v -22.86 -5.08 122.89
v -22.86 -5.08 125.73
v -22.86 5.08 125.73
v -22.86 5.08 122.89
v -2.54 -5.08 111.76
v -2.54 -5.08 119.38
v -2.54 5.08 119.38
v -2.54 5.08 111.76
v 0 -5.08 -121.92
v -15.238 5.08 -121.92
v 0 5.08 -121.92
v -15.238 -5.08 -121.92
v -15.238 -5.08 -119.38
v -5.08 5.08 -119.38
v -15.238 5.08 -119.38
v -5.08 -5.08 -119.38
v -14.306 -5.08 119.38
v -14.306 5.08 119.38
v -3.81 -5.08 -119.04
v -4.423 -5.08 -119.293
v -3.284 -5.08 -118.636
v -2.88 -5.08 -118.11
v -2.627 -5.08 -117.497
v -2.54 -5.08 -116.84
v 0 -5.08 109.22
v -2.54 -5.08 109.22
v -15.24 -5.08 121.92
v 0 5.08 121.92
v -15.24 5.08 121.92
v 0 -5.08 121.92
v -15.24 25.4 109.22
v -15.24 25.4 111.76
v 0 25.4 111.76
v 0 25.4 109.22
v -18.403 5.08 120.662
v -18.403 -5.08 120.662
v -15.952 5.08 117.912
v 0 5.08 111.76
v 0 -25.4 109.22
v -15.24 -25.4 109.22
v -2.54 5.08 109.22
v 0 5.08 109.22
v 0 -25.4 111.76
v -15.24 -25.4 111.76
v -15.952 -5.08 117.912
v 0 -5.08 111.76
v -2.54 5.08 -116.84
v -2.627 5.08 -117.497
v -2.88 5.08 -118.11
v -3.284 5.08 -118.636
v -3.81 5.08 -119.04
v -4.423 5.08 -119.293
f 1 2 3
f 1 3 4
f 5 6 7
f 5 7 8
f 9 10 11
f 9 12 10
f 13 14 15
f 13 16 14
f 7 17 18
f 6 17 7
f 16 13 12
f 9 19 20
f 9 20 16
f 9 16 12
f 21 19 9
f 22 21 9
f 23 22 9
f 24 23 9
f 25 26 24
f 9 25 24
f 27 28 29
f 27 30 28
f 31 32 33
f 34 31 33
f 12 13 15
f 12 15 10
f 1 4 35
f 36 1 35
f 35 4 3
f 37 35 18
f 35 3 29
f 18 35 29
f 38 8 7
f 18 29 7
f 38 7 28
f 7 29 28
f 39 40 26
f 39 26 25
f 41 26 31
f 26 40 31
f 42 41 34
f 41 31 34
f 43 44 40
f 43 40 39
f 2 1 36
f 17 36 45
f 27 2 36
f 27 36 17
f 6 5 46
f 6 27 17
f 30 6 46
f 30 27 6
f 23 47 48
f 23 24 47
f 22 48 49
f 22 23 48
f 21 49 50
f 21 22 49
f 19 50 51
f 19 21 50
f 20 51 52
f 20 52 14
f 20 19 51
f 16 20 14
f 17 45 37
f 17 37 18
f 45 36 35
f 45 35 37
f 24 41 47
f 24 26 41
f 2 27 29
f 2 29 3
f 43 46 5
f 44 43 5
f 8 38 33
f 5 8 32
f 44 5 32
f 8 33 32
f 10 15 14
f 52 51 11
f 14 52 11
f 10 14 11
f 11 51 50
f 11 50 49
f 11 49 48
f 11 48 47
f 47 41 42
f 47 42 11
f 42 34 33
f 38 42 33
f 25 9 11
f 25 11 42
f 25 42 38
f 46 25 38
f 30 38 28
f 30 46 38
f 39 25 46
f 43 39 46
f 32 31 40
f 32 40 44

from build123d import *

# Parameters (mm, degrees)
F0_W          = 2.54
F0_H          = 2.54
F1_DEPTH      = 5.08
F1_DEPTH_BACK = 5.08
F0_W_2        = 12.7
F2_DEPTH      = 25.4
F2_DEPTH_BACK = 25.4
F3_R          = 2.54


with BuildPart() as f1:
    # F0 (on Front) → F1 (new body, two sides)
    with BuildSketch(Plane.XZ) as f1_sk:
        Polygon((-2.54, 111.76), (0, 111.76), (0, 121.92), (-15.24, 121.92), (-22.86, 125.73), (-22.86, 122.8901936686), (-18.4033727053, 120.6618800212), (-15.8396126628, 119.38), (-14.30558227, 119.38), (-2.54, 119.38), align=None)
        Polygon((-15.2376033366, -121.92), (0, -121.92), (0, 109.22), (-2.54, 109.22), (-2.54, -119.38), (-15.2376033366, -119.38), align=None)
        with Locations((-1.27, 110.49)):
            Rectangle(F0_W, F0_H)
        Polygon((-15.9520190209, 117.9121956229), (-14.30558227, 119.38), (-15.8396126628, 119.38), (-18.4033727053, 120.6618800212), align=None)
    extrude(amount=F1_DEPTH)
    extrude(f1_sk.sketch, amount=-F1_DEPTH_BACK)

    # F0 (on Front) → F2 (join, two sides)
    with BuildSketch(Plane.XZ) as f2_sk:
        with Locations((-1.27, 110.49)):
            Rectangle(F0_W, F0_H)
        with Locations((-8.89, 110.49)):
            Rectangle(F0_W_2, F0_H)
    extrude(amount=F2_DEPTH)
    extrude(f2_sk.sketch, amount=-F2_DEPTH_BACK)

    # F3
    f3_edges = [f1.edges().sort_by_distance(p)[0] for p in [
        (-2.54, 0, -119.38),
    ]]
    fillet(f3_edges, radius=F3_R)


solid = f1.part
